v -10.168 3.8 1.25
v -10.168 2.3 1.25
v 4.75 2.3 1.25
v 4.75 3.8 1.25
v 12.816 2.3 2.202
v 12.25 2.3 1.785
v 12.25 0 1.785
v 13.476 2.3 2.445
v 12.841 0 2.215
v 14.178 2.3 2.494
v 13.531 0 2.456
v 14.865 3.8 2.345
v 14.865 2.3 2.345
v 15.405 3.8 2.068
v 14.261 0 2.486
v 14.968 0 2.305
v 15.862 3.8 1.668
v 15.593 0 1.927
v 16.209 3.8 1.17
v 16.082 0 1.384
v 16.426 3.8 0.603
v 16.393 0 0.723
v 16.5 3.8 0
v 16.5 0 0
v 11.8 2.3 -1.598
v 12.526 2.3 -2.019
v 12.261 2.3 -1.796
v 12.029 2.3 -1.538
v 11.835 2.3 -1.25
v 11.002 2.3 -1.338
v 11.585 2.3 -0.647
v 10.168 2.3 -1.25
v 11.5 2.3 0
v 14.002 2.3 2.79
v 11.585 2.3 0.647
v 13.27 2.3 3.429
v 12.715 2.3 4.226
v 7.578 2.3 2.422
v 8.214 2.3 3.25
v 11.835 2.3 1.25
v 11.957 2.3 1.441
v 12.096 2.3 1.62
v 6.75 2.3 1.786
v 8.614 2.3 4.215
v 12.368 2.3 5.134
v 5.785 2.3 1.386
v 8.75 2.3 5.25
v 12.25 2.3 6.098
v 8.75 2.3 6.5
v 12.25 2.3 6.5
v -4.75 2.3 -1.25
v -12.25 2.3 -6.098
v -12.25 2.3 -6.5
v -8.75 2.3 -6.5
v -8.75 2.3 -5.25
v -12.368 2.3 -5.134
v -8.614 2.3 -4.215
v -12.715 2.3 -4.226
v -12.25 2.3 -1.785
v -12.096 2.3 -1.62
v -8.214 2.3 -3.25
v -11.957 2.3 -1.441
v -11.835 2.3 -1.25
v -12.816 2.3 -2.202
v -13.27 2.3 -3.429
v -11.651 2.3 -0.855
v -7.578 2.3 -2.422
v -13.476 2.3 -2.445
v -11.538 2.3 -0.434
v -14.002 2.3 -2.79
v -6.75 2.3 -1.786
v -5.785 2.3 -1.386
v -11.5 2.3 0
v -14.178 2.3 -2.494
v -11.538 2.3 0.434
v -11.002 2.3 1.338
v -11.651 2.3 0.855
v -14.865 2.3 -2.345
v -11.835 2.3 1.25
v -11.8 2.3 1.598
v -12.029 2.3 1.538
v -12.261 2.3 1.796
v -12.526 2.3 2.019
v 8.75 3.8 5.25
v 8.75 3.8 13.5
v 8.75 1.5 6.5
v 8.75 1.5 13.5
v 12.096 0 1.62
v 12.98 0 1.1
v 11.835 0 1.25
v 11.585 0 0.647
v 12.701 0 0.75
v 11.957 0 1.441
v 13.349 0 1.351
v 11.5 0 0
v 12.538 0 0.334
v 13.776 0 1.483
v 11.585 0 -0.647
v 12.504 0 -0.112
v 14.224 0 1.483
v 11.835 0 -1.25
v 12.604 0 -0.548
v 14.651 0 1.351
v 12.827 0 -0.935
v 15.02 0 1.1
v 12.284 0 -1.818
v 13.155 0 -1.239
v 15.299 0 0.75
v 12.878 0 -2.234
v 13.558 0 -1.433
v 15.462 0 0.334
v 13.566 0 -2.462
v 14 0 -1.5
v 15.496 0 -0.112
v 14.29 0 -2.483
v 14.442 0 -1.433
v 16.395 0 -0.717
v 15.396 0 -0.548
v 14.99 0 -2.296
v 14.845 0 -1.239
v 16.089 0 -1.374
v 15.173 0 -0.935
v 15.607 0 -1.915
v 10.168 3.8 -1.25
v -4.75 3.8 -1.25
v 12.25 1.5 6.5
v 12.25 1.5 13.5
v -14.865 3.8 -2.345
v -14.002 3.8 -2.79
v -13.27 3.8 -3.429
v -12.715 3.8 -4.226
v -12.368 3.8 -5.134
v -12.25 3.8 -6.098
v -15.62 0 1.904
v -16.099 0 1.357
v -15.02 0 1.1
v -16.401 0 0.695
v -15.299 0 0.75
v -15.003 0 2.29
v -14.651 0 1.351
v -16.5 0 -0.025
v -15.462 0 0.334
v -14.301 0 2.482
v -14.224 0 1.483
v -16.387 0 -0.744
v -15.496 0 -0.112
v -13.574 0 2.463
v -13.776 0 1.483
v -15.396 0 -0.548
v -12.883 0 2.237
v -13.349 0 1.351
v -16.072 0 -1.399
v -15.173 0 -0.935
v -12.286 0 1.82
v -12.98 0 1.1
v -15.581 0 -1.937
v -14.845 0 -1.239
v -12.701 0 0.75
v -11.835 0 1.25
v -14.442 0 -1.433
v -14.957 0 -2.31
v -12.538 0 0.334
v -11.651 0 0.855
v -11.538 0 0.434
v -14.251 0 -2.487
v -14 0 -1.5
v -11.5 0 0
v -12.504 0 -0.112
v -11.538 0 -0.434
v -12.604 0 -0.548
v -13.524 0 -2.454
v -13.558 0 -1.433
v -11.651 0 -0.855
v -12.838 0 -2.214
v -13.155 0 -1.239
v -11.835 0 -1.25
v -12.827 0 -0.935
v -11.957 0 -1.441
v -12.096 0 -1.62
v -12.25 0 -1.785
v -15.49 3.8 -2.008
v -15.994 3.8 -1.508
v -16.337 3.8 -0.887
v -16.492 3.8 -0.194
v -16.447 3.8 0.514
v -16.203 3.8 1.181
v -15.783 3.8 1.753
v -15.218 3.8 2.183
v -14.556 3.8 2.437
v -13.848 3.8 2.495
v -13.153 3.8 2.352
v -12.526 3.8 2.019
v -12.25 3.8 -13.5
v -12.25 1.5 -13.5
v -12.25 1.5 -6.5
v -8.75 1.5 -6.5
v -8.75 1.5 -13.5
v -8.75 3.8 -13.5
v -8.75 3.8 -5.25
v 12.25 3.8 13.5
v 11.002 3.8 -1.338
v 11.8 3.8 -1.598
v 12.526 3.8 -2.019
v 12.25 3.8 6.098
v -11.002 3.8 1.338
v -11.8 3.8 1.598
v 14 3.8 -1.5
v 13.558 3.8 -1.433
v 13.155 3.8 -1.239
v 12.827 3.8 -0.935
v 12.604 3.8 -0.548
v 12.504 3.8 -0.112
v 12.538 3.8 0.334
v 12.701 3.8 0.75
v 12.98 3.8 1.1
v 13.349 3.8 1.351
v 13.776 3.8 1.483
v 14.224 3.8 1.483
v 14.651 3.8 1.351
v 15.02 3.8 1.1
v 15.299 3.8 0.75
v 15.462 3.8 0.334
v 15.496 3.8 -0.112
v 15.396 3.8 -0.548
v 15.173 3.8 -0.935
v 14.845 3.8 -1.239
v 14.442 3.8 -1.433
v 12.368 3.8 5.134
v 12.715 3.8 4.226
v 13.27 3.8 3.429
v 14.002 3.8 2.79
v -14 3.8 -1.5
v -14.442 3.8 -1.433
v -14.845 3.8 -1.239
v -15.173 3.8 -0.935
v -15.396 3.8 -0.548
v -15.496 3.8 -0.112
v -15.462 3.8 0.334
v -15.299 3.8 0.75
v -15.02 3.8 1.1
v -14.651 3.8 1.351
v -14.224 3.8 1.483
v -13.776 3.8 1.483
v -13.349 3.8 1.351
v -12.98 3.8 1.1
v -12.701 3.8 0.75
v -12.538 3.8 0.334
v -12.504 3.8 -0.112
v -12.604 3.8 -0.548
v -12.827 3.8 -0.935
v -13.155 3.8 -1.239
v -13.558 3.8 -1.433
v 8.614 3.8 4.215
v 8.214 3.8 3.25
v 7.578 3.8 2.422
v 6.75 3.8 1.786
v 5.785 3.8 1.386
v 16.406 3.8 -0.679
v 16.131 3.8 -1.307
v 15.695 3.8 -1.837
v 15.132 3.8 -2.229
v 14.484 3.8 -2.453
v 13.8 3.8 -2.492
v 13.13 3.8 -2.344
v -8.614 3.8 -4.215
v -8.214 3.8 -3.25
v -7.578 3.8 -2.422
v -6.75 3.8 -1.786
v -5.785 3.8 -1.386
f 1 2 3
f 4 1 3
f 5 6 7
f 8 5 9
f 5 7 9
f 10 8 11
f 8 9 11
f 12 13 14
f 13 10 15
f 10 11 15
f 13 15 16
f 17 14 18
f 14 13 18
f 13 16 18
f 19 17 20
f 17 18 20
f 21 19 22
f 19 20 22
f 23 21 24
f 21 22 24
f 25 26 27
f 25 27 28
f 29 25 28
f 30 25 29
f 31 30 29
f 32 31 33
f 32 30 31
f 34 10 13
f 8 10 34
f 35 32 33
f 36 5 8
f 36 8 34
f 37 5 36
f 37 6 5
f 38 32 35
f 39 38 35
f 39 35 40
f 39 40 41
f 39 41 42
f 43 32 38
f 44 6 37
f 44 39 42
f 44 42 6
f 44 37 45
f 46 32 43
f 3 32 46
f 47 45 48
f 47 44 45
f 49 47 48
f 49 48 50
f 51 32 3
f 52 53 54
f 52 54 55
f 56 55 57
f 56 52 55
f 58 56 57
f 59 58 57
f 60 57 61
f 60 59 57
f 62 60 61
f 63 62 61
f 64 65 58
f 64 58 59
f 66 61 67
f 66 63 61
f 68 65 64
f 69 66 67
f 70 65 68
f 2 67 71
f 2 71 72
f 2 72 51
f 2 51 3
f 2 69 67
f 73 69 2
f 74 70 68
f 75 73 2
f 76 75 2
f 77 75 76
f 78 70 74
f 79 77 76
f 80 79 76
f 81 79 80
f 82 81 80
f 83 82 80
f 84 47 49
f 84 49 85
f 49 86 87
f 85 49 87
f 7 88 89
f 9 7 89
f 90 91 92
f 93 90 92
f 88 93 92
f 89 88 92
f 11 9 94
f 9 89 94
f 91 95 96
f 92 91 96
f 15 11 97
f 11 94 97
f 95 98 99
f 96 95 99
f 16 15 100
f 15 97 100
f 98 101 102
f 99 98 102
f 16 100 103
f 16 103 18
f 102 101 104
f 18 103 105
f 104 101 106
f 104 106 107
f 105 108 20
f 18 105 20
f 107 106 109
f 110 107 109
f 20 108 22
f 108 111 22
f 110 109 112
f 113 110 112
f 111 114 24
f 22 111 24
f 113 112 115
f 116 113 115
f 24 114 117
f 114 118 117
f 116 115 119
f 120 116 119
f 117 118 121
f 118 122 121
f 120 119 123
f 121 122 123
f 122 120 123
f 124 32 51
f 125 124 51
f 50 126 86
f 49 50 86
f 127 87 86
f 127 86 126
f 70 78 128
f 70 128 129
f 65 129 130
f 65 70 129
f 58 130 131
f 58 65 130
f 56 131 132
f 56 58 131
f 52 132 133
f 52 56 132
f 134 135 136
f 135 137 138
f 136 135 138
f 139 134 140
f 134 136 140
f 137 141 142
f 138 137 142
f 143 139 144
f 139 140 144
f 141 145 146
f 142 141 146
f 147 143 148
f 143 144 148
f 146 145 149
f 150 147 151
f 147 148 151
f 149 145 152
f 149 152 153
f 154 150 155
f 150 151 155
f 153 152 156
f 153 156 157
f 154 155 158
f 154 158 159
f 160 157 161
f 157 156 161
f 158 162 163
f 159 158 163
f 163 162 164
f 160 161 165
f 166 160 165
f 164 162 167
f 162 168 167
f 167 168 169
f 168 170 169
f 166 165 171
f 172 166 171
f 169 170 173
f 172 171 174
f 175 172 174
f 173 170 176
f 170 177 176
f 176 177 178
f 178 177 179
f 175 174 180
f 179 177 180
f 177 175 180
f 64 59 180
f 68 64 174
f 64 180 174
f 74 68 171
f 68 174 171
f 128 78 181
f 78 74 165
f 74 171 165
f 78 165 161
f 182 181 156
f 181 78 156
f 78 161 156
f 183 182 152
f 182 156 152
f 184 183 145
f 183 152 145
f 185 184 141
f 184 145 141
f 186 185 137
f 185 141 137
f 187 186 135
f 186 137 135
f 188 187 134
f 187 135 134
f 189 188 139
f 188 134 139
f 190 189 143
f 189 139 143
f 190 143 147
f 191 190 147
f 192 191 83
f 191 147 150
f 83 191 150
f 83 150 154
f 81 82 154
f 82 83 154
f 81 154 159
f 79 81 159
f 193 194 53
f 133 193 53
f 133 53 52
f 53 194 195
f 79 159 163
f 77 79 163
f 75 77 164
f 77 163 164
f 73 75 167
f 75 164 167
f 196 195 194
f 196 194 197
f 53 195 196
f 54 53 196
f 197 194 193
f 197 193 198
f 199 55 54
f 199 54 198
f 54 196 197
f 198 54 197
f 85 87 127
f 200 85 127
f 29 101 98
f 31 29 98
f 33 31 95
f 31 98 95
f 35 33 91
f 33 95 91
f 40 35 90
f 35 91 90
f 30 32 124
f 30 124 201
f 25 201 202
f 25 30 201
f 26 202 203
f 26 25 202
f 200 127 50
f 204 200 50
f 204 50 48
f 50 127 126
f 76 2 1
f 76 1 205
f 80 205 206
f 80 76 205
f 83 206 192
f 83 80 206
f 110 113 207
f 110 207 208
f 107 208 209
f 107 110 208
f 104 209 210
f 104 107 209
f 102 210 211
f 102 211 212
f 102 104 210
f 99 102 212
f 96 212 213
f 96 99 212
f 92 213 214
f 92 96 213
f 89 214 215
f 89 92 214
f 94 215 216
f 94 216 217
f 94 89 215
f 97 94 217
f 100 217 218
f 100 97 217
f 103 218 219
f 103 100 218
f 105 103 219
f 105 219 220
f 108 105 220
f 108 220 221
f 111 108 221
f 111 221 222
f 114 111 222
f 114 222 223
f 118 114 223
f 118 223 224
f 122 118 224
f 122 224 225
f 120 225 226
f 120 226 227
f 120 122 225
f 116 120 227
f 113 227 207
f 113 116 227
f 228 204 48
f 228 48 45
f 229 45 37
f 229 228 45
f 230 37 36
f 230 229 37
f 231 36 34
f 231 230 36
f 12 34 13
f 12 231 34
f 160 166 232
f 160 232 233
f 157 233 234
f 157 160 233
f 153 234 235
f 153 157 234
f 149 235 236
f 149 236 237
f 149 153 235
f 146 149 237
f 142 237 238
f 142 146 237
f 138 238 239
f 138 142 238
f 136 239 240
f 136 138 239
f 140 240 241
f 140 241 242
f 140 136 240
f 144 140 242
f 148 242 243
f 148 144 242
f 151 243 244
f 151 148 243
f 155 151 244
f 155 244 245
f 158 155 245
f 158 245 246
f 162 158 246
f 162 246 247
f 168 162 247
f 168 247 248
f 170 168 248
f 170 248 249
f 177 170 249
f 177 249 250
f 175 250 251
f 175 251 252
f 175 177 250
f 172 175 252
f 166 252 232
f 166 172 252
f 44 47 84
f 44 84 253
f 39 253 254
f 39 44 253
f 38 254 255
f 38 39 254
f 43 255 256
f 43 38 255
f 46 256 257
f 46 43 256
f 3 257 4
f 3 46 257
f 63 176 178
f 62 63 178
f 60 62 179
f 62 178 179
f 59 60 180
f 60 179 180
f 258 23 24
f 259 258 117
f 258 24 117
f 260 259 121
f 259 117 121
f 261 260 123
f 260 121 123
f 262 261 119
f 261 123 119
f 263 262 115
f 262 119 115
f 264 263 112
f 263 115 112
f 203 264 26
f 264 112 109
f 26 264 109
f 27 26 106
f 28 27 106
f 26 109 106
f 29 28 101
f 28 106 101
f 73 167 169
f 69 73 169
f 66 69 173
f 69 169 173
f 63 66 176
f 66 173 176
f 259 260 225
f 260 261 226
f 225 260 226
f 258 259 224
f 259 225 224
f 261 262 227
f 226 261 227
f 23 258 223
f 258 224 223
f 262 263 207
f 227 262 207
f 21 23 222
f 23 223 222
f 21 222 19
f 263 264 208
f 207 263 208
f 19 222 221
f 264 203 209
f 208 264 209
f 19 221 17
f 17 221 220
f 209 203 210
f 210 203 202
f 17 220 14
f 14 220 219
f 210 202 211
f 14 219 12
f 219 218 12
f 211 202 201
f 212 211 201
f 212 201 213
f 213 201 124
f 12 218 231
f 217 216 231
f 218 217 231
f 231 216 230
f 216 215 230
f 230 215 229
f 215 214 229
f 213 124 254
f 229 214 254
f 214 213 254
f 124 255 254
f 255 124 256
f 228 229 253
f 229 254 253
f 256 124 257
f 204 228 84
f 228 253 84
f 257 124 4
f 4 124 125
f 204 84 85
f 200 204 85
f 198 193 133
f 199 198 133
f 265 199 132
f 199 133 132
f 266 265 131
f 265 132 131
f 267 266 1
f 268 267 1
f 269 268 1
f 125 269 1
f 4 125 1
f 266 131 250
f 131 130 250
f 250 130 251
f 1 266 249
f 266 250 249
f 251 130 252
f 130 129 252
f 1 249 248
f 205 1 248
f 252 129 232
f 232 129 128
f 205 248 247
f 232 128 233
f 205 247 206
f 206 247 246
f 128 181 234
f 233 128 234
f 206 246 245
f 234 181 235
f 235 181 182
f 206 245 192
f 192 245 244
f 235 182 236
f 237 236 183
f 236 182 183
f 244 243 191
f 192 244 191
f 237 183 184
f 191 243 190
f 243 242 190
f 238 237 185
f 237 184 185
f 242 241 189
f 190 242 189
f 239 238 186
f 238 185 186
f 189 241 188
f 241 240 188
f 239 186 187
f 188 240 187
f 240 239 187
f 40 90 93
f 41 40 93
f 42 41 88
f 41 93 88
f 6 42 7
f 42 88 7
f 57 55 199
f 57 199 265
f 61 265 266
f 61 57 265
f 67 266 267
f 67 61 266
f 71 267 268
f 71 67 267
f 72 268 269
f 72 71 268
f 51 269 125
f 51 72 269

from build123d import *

# Parameters (mm, degrees)
SKETCH1_R           = 1.5
BOSS_EXTRUDE2_DEPTH = 3.8
BOSS_EXTRUDE3_START = -3.8
SKETCH2_W           = 3.5
SKETCH2_H           = 7
SKETCH2_H_2         = 5.25
BOSS_EXTRUDE3_DEPTH = 3.8
CUT_EXTRUDE1_DEPTH  = 2.3
SKETCH4_W           = 3.5
SKETCH4_H           = 7
CUT_EXTRUDE2_DEPTH  = 1.5
FILLET1_R           = 4


with BuildPart() as part:
    # Sketch1 → Boss-Extrude2 (new body)
    # profile 1 of 5: a face of its own
    with BuildSketch(Plane(origin=(0, 0, 0), x_dir=(1, 0, 0), z_dir=(0, 1, 0))):
        with BuildLine():
            Line((-11.834936491, -1.25), (-11.834936491, 1.25))
            ThreePointArc((-11.834936491, 1.25), (-16.5, 0), (-11.834936491, -1.25))
        make_face()
        with Locations(Location((-14, 0, 0), (0, 0, 90))):
            Circle(SKETCH1_R, mode=Mode.SUBTRACT)
    # profile 2 of 5: a face of its own
    with BuildSketch(Plane(origin=(0, 0, 0), x_dir=(1, 0, 0), z_dir=(0, 1, 0))):
        with BuildLine():
            ThreePointArc((-11.5, 0), (-11.585185434, 0.647047613), (-11.834936491, 1.25))
            Line((-11.834936491, 1.25), (-11.834936491, -1.25))
            ThreePointArc((-11.834936491, -1.25), (-11.585185434, -0.647047613), (-11.5, 0))
        make_face()
    # profile 3 of 5: a face of its own
    with BuildSketch(Plane(origin=(0, 0, 0), x_dir=(1, 0, 0), z_dir=(0, 1, 0))):
        with BuildLine():
            Line((11.834936491, 1.25), (-11.834936491, 1.25))
            ThreePointArc((-11.834936491, 1.25), (-11.585185434, 0.647047613), (-11.5, 0))
            ThreePointArc((-11.5, 0), (-11.585185434, -0.647047613), (-11.834936491, -1.25))
            Line((-11.834936491, -1.25), (11.834936491, -1.25))
            ThreePointArc((11.834936491, -1.25), (11.5, 0), (11.834936491, 1.25))
        make_face()
    # profile 4 of 5: a face of its own
    with BuildSketch(Plane(origin=(0, 0, 0), x_dir=(1, 0, 0), z_dir=(0, 1, 0))):
        with BuildLine():
            Line((11.834936491, -1.25), (11.834936491, 1.25))
            ThreePointArc((11.834936491, 1.25), (11.5, 0), (11.834936491, -1.25))
        make_face()
    # profile 5 of 5: a face of its own
    with BuildSketch(Plane(origin=(0, 0, 0), x_dir=(1, 0, 0), z_dir=(0, 1, 0))):
        with BuildLine():
            ThreePointArc((16.5, 0), (14.647047613, 2.414814566), (11.834936491, 1.25))
            Line((11.834936491, 1.25), (11.834936491, -1.25))
            ThreePointArc((11.834936491, -1.25), (14.647047613, -2.414814566), (16.5, 0))
        make_face()
        with Locations(Location((14, 0, 0), (0, 0, 90))):
            Circle(SKETCH1_R, mode=Mode.SUBTRACT)
    extrude(amount=BOSS_EXTRUDE2_DEPTH)

    # Sketch2 → Boss-Extrude3 (add)
    with BuildSketch(Plane(origin=(0, 3.8, 0), x_dir=(1, 0, 0), z_dir=(0, 1, 0)).offset(BOSS_EXTRUDE3_START)):
        with Locations((-10.5, 10)):
            Rectangle(SKETCH2_W, SKETCH2_H)
        with BuildLine():
            Line((-8.75, 6.5), (-12.25, 6.5))
            Line((-12.25, 6.5), (-12.25, 1.785357107))
            ThreePointArc((-12.25, 1.785357107), (-12.024251438, 1.531802083), (-11.834936491, 1.25))
            Line((-11.834936491, 1.25), (-8.75, 1.25))
            Line((-8.75, 1.25), (-8.75, 6.5))
        make_face()
        with Locations((10.5, -3.875)):
            Rectangle(SKETCH2_W, SKETCH2_H_2)
        with Locations((10.5, -10)):
            Rectangle(SKETCH2_W, SKETCH2_H)
    extrude(amount=BOSS_EXTRUDE3_DEPTH)

    # Sketch3 → Cut-Extrude1 (cut)
    with BuildSketch(Plane.XZ):
        with BuildLine():
            Line((11.834936491, 1.25), (8.75, 1.25))
            Line((8.75, 1.25), (-11.834936491, 1.25))
            ThreePointArc((-11.834936491, 1.25), (-11.585185434, 0.647047613), (-11.5, 0))
            ThreePointArc((-11.5, 0), (-11.585185434, -0.647047613), (-11.834936491, -1.25))
            Line((-11.834936491, -1.25), (-8.75, -1.25))
            Line((-8.75, -1.25), (11.834936491, -1.25))
            ThreePointArc((11.834936491, -1.25), (11.5, 0), (11.834936491, 1.25))
        make_face()
        with BuildLine():
            Line((12.25, 6.5), (8.75, 6.5))
            Line((8.75, 6.5), (8.75, 1.25))
            Line((8.75, 1.25), (11.834936491, 1.25))
            ThreePointArc((11.834936491, 1.25), (12.024251438, 1.531802083), (12.25, 1.785357107))
            Line((12.25, 1.785357107), (12.25, 6.5))
        make_face()
        with BuildLine():
            ThreePointArc((-11.834936491, -1.25), (-12.024251438, -1.531802083), (-12.25, -1.785357107))
            Line((-12.25, -1.785357107), (-12.25, -6.5))
            Line((-12.25, -6.5), (-8.75, -6.5))
            Line((-8.75, -6.5), (-8.75, -1.25))
            Line((-8.75, -1.25), (-11.834936491, -1.25))
        make_face()
    extrude(amount=-CUT_EXTRUDE1_DEPTH, mode=Mode.SUBTRACT)

    # Sketch4 → Cut-Extrude2 (cut)
    with BuildSketch(Plane.XZ):
        with Locations((-10.5, -10)):
            Rectangle(SKETCH4_W, SKETCH4_H)
        with Locations((10.5, 10)):
            Rectangle(SKETCH4_W, SKETCH4_H)
    extrude(amount=-CUT_EXTRUDE2_DEPTH, mode=Mode.SUBTRACT)

    # Fillet1
    # the kernel refuses this fillet: 4 mm, written as the material it adds along each edge
    with BuildSketch(Plane(origin=(11.834936491, 2.3, -1.25), x_dir=(-1, 0, 0), z_dir=(0, 1, 0))) as fillet1_piece_1:
        with BuildLine():
            CenterArc((1.66736392, -4), FILLET1_R, 90, 36.128927472)
            ThreePointArc((-0.69105296, -0.769230769), (-0.305320518, -0.420735169), (0, 0))
            Line((0, 0), (1.66736392, 0))
        make_face()
    extrude(amount=1.5)
    with BuildSketch(Plane(origin=(-11.834936491, 2.3, 1.25), x_dir=(-0.668294067479168, 0, 0.743897196776644), z_dir=(0, 1, 0))) as fillet1_piece_2:
        with BuildLine():
            CenterArc((1.861299371, 3.913523616), FILLET1_R, 221.935536264, 36.128927472)
            Line((-1.114289416, 1.240347346), (0, 0))
            ThreePointArc((0, 0), (0.517027603, 0.05404774), (1.034055206, 0))
        make_face()
    extrude(amount=1.5)
    with BuildSketch(Plane(origin=(8.75, 2.3, 1.25), x_dir=(-1, 0, 0), z_dir=(0, 1, 0))) as fillet1_piece_3:
        with BuildLine():
            CenterArc((FILLET1_R, FILLET1_R), FILLET1_R, 180, 90)
            Line((0, FILLET1_R), (0, 0))
            Line((0, 0), (FILLET1_R, 0))
        make_face()
    extrude(amount=1.5)
    with BuildSketch(Plane(origin=(12.25, 3.8, 1.785357107), x_dir=(0.9778293887496555, 0, 0.20940316735301484), z_dir=(0, -1, 0))) as fillet1_piece_4:
        with BuildLine():
            CenterArc((4.81443119, 3.379568307), FILLET1_R, 167.912621371, 69.747753258)
            Line((0.903113635, 4.217180976), (0, 0))
            ThreePointArc((0, 0), (1.337341997, 0.387769808), (2.674683994, 0))
        make_face()
    extrude(amount=1.5)
    with BuildSketch(Plane(origin=(-12.25, 2.3, -1.785357107), x_dir=(-0.9778293887496644, 0, -0.20940316735297415), z_dir=(0, 1, 0))) as fillet1_piece_5:
        with BuildLine():
            CenterArc((4.81443119, -3.379568307), FILLET1_R, 122.339625371, 69.747753258)
            Line((0.903113635, -4.217180976), (0, 0))
            ThreePointArc((0, 0), (1.337341997, -0.387769808), (2.674683994, 0))
        make_face()
    extrude(amount=1.5)
    with BuildSketch(Plane(origin=(-8.75, 2.3, -1.25), x_dir=(0, 0, -1), z_dir=(0, 1, 0))) as fillet1_piece_6:
        with BuildLine():
            CenterArc((FILLET1_R, -FILLET1_R), FILLET1_R, 90, 90)
            Line((0, -FILLET1_R), (0, 0))
            Line((0, 0), (FILLET1_R, 0))
        make_face()
    extrude(amount=1.5)


solid = part.part
